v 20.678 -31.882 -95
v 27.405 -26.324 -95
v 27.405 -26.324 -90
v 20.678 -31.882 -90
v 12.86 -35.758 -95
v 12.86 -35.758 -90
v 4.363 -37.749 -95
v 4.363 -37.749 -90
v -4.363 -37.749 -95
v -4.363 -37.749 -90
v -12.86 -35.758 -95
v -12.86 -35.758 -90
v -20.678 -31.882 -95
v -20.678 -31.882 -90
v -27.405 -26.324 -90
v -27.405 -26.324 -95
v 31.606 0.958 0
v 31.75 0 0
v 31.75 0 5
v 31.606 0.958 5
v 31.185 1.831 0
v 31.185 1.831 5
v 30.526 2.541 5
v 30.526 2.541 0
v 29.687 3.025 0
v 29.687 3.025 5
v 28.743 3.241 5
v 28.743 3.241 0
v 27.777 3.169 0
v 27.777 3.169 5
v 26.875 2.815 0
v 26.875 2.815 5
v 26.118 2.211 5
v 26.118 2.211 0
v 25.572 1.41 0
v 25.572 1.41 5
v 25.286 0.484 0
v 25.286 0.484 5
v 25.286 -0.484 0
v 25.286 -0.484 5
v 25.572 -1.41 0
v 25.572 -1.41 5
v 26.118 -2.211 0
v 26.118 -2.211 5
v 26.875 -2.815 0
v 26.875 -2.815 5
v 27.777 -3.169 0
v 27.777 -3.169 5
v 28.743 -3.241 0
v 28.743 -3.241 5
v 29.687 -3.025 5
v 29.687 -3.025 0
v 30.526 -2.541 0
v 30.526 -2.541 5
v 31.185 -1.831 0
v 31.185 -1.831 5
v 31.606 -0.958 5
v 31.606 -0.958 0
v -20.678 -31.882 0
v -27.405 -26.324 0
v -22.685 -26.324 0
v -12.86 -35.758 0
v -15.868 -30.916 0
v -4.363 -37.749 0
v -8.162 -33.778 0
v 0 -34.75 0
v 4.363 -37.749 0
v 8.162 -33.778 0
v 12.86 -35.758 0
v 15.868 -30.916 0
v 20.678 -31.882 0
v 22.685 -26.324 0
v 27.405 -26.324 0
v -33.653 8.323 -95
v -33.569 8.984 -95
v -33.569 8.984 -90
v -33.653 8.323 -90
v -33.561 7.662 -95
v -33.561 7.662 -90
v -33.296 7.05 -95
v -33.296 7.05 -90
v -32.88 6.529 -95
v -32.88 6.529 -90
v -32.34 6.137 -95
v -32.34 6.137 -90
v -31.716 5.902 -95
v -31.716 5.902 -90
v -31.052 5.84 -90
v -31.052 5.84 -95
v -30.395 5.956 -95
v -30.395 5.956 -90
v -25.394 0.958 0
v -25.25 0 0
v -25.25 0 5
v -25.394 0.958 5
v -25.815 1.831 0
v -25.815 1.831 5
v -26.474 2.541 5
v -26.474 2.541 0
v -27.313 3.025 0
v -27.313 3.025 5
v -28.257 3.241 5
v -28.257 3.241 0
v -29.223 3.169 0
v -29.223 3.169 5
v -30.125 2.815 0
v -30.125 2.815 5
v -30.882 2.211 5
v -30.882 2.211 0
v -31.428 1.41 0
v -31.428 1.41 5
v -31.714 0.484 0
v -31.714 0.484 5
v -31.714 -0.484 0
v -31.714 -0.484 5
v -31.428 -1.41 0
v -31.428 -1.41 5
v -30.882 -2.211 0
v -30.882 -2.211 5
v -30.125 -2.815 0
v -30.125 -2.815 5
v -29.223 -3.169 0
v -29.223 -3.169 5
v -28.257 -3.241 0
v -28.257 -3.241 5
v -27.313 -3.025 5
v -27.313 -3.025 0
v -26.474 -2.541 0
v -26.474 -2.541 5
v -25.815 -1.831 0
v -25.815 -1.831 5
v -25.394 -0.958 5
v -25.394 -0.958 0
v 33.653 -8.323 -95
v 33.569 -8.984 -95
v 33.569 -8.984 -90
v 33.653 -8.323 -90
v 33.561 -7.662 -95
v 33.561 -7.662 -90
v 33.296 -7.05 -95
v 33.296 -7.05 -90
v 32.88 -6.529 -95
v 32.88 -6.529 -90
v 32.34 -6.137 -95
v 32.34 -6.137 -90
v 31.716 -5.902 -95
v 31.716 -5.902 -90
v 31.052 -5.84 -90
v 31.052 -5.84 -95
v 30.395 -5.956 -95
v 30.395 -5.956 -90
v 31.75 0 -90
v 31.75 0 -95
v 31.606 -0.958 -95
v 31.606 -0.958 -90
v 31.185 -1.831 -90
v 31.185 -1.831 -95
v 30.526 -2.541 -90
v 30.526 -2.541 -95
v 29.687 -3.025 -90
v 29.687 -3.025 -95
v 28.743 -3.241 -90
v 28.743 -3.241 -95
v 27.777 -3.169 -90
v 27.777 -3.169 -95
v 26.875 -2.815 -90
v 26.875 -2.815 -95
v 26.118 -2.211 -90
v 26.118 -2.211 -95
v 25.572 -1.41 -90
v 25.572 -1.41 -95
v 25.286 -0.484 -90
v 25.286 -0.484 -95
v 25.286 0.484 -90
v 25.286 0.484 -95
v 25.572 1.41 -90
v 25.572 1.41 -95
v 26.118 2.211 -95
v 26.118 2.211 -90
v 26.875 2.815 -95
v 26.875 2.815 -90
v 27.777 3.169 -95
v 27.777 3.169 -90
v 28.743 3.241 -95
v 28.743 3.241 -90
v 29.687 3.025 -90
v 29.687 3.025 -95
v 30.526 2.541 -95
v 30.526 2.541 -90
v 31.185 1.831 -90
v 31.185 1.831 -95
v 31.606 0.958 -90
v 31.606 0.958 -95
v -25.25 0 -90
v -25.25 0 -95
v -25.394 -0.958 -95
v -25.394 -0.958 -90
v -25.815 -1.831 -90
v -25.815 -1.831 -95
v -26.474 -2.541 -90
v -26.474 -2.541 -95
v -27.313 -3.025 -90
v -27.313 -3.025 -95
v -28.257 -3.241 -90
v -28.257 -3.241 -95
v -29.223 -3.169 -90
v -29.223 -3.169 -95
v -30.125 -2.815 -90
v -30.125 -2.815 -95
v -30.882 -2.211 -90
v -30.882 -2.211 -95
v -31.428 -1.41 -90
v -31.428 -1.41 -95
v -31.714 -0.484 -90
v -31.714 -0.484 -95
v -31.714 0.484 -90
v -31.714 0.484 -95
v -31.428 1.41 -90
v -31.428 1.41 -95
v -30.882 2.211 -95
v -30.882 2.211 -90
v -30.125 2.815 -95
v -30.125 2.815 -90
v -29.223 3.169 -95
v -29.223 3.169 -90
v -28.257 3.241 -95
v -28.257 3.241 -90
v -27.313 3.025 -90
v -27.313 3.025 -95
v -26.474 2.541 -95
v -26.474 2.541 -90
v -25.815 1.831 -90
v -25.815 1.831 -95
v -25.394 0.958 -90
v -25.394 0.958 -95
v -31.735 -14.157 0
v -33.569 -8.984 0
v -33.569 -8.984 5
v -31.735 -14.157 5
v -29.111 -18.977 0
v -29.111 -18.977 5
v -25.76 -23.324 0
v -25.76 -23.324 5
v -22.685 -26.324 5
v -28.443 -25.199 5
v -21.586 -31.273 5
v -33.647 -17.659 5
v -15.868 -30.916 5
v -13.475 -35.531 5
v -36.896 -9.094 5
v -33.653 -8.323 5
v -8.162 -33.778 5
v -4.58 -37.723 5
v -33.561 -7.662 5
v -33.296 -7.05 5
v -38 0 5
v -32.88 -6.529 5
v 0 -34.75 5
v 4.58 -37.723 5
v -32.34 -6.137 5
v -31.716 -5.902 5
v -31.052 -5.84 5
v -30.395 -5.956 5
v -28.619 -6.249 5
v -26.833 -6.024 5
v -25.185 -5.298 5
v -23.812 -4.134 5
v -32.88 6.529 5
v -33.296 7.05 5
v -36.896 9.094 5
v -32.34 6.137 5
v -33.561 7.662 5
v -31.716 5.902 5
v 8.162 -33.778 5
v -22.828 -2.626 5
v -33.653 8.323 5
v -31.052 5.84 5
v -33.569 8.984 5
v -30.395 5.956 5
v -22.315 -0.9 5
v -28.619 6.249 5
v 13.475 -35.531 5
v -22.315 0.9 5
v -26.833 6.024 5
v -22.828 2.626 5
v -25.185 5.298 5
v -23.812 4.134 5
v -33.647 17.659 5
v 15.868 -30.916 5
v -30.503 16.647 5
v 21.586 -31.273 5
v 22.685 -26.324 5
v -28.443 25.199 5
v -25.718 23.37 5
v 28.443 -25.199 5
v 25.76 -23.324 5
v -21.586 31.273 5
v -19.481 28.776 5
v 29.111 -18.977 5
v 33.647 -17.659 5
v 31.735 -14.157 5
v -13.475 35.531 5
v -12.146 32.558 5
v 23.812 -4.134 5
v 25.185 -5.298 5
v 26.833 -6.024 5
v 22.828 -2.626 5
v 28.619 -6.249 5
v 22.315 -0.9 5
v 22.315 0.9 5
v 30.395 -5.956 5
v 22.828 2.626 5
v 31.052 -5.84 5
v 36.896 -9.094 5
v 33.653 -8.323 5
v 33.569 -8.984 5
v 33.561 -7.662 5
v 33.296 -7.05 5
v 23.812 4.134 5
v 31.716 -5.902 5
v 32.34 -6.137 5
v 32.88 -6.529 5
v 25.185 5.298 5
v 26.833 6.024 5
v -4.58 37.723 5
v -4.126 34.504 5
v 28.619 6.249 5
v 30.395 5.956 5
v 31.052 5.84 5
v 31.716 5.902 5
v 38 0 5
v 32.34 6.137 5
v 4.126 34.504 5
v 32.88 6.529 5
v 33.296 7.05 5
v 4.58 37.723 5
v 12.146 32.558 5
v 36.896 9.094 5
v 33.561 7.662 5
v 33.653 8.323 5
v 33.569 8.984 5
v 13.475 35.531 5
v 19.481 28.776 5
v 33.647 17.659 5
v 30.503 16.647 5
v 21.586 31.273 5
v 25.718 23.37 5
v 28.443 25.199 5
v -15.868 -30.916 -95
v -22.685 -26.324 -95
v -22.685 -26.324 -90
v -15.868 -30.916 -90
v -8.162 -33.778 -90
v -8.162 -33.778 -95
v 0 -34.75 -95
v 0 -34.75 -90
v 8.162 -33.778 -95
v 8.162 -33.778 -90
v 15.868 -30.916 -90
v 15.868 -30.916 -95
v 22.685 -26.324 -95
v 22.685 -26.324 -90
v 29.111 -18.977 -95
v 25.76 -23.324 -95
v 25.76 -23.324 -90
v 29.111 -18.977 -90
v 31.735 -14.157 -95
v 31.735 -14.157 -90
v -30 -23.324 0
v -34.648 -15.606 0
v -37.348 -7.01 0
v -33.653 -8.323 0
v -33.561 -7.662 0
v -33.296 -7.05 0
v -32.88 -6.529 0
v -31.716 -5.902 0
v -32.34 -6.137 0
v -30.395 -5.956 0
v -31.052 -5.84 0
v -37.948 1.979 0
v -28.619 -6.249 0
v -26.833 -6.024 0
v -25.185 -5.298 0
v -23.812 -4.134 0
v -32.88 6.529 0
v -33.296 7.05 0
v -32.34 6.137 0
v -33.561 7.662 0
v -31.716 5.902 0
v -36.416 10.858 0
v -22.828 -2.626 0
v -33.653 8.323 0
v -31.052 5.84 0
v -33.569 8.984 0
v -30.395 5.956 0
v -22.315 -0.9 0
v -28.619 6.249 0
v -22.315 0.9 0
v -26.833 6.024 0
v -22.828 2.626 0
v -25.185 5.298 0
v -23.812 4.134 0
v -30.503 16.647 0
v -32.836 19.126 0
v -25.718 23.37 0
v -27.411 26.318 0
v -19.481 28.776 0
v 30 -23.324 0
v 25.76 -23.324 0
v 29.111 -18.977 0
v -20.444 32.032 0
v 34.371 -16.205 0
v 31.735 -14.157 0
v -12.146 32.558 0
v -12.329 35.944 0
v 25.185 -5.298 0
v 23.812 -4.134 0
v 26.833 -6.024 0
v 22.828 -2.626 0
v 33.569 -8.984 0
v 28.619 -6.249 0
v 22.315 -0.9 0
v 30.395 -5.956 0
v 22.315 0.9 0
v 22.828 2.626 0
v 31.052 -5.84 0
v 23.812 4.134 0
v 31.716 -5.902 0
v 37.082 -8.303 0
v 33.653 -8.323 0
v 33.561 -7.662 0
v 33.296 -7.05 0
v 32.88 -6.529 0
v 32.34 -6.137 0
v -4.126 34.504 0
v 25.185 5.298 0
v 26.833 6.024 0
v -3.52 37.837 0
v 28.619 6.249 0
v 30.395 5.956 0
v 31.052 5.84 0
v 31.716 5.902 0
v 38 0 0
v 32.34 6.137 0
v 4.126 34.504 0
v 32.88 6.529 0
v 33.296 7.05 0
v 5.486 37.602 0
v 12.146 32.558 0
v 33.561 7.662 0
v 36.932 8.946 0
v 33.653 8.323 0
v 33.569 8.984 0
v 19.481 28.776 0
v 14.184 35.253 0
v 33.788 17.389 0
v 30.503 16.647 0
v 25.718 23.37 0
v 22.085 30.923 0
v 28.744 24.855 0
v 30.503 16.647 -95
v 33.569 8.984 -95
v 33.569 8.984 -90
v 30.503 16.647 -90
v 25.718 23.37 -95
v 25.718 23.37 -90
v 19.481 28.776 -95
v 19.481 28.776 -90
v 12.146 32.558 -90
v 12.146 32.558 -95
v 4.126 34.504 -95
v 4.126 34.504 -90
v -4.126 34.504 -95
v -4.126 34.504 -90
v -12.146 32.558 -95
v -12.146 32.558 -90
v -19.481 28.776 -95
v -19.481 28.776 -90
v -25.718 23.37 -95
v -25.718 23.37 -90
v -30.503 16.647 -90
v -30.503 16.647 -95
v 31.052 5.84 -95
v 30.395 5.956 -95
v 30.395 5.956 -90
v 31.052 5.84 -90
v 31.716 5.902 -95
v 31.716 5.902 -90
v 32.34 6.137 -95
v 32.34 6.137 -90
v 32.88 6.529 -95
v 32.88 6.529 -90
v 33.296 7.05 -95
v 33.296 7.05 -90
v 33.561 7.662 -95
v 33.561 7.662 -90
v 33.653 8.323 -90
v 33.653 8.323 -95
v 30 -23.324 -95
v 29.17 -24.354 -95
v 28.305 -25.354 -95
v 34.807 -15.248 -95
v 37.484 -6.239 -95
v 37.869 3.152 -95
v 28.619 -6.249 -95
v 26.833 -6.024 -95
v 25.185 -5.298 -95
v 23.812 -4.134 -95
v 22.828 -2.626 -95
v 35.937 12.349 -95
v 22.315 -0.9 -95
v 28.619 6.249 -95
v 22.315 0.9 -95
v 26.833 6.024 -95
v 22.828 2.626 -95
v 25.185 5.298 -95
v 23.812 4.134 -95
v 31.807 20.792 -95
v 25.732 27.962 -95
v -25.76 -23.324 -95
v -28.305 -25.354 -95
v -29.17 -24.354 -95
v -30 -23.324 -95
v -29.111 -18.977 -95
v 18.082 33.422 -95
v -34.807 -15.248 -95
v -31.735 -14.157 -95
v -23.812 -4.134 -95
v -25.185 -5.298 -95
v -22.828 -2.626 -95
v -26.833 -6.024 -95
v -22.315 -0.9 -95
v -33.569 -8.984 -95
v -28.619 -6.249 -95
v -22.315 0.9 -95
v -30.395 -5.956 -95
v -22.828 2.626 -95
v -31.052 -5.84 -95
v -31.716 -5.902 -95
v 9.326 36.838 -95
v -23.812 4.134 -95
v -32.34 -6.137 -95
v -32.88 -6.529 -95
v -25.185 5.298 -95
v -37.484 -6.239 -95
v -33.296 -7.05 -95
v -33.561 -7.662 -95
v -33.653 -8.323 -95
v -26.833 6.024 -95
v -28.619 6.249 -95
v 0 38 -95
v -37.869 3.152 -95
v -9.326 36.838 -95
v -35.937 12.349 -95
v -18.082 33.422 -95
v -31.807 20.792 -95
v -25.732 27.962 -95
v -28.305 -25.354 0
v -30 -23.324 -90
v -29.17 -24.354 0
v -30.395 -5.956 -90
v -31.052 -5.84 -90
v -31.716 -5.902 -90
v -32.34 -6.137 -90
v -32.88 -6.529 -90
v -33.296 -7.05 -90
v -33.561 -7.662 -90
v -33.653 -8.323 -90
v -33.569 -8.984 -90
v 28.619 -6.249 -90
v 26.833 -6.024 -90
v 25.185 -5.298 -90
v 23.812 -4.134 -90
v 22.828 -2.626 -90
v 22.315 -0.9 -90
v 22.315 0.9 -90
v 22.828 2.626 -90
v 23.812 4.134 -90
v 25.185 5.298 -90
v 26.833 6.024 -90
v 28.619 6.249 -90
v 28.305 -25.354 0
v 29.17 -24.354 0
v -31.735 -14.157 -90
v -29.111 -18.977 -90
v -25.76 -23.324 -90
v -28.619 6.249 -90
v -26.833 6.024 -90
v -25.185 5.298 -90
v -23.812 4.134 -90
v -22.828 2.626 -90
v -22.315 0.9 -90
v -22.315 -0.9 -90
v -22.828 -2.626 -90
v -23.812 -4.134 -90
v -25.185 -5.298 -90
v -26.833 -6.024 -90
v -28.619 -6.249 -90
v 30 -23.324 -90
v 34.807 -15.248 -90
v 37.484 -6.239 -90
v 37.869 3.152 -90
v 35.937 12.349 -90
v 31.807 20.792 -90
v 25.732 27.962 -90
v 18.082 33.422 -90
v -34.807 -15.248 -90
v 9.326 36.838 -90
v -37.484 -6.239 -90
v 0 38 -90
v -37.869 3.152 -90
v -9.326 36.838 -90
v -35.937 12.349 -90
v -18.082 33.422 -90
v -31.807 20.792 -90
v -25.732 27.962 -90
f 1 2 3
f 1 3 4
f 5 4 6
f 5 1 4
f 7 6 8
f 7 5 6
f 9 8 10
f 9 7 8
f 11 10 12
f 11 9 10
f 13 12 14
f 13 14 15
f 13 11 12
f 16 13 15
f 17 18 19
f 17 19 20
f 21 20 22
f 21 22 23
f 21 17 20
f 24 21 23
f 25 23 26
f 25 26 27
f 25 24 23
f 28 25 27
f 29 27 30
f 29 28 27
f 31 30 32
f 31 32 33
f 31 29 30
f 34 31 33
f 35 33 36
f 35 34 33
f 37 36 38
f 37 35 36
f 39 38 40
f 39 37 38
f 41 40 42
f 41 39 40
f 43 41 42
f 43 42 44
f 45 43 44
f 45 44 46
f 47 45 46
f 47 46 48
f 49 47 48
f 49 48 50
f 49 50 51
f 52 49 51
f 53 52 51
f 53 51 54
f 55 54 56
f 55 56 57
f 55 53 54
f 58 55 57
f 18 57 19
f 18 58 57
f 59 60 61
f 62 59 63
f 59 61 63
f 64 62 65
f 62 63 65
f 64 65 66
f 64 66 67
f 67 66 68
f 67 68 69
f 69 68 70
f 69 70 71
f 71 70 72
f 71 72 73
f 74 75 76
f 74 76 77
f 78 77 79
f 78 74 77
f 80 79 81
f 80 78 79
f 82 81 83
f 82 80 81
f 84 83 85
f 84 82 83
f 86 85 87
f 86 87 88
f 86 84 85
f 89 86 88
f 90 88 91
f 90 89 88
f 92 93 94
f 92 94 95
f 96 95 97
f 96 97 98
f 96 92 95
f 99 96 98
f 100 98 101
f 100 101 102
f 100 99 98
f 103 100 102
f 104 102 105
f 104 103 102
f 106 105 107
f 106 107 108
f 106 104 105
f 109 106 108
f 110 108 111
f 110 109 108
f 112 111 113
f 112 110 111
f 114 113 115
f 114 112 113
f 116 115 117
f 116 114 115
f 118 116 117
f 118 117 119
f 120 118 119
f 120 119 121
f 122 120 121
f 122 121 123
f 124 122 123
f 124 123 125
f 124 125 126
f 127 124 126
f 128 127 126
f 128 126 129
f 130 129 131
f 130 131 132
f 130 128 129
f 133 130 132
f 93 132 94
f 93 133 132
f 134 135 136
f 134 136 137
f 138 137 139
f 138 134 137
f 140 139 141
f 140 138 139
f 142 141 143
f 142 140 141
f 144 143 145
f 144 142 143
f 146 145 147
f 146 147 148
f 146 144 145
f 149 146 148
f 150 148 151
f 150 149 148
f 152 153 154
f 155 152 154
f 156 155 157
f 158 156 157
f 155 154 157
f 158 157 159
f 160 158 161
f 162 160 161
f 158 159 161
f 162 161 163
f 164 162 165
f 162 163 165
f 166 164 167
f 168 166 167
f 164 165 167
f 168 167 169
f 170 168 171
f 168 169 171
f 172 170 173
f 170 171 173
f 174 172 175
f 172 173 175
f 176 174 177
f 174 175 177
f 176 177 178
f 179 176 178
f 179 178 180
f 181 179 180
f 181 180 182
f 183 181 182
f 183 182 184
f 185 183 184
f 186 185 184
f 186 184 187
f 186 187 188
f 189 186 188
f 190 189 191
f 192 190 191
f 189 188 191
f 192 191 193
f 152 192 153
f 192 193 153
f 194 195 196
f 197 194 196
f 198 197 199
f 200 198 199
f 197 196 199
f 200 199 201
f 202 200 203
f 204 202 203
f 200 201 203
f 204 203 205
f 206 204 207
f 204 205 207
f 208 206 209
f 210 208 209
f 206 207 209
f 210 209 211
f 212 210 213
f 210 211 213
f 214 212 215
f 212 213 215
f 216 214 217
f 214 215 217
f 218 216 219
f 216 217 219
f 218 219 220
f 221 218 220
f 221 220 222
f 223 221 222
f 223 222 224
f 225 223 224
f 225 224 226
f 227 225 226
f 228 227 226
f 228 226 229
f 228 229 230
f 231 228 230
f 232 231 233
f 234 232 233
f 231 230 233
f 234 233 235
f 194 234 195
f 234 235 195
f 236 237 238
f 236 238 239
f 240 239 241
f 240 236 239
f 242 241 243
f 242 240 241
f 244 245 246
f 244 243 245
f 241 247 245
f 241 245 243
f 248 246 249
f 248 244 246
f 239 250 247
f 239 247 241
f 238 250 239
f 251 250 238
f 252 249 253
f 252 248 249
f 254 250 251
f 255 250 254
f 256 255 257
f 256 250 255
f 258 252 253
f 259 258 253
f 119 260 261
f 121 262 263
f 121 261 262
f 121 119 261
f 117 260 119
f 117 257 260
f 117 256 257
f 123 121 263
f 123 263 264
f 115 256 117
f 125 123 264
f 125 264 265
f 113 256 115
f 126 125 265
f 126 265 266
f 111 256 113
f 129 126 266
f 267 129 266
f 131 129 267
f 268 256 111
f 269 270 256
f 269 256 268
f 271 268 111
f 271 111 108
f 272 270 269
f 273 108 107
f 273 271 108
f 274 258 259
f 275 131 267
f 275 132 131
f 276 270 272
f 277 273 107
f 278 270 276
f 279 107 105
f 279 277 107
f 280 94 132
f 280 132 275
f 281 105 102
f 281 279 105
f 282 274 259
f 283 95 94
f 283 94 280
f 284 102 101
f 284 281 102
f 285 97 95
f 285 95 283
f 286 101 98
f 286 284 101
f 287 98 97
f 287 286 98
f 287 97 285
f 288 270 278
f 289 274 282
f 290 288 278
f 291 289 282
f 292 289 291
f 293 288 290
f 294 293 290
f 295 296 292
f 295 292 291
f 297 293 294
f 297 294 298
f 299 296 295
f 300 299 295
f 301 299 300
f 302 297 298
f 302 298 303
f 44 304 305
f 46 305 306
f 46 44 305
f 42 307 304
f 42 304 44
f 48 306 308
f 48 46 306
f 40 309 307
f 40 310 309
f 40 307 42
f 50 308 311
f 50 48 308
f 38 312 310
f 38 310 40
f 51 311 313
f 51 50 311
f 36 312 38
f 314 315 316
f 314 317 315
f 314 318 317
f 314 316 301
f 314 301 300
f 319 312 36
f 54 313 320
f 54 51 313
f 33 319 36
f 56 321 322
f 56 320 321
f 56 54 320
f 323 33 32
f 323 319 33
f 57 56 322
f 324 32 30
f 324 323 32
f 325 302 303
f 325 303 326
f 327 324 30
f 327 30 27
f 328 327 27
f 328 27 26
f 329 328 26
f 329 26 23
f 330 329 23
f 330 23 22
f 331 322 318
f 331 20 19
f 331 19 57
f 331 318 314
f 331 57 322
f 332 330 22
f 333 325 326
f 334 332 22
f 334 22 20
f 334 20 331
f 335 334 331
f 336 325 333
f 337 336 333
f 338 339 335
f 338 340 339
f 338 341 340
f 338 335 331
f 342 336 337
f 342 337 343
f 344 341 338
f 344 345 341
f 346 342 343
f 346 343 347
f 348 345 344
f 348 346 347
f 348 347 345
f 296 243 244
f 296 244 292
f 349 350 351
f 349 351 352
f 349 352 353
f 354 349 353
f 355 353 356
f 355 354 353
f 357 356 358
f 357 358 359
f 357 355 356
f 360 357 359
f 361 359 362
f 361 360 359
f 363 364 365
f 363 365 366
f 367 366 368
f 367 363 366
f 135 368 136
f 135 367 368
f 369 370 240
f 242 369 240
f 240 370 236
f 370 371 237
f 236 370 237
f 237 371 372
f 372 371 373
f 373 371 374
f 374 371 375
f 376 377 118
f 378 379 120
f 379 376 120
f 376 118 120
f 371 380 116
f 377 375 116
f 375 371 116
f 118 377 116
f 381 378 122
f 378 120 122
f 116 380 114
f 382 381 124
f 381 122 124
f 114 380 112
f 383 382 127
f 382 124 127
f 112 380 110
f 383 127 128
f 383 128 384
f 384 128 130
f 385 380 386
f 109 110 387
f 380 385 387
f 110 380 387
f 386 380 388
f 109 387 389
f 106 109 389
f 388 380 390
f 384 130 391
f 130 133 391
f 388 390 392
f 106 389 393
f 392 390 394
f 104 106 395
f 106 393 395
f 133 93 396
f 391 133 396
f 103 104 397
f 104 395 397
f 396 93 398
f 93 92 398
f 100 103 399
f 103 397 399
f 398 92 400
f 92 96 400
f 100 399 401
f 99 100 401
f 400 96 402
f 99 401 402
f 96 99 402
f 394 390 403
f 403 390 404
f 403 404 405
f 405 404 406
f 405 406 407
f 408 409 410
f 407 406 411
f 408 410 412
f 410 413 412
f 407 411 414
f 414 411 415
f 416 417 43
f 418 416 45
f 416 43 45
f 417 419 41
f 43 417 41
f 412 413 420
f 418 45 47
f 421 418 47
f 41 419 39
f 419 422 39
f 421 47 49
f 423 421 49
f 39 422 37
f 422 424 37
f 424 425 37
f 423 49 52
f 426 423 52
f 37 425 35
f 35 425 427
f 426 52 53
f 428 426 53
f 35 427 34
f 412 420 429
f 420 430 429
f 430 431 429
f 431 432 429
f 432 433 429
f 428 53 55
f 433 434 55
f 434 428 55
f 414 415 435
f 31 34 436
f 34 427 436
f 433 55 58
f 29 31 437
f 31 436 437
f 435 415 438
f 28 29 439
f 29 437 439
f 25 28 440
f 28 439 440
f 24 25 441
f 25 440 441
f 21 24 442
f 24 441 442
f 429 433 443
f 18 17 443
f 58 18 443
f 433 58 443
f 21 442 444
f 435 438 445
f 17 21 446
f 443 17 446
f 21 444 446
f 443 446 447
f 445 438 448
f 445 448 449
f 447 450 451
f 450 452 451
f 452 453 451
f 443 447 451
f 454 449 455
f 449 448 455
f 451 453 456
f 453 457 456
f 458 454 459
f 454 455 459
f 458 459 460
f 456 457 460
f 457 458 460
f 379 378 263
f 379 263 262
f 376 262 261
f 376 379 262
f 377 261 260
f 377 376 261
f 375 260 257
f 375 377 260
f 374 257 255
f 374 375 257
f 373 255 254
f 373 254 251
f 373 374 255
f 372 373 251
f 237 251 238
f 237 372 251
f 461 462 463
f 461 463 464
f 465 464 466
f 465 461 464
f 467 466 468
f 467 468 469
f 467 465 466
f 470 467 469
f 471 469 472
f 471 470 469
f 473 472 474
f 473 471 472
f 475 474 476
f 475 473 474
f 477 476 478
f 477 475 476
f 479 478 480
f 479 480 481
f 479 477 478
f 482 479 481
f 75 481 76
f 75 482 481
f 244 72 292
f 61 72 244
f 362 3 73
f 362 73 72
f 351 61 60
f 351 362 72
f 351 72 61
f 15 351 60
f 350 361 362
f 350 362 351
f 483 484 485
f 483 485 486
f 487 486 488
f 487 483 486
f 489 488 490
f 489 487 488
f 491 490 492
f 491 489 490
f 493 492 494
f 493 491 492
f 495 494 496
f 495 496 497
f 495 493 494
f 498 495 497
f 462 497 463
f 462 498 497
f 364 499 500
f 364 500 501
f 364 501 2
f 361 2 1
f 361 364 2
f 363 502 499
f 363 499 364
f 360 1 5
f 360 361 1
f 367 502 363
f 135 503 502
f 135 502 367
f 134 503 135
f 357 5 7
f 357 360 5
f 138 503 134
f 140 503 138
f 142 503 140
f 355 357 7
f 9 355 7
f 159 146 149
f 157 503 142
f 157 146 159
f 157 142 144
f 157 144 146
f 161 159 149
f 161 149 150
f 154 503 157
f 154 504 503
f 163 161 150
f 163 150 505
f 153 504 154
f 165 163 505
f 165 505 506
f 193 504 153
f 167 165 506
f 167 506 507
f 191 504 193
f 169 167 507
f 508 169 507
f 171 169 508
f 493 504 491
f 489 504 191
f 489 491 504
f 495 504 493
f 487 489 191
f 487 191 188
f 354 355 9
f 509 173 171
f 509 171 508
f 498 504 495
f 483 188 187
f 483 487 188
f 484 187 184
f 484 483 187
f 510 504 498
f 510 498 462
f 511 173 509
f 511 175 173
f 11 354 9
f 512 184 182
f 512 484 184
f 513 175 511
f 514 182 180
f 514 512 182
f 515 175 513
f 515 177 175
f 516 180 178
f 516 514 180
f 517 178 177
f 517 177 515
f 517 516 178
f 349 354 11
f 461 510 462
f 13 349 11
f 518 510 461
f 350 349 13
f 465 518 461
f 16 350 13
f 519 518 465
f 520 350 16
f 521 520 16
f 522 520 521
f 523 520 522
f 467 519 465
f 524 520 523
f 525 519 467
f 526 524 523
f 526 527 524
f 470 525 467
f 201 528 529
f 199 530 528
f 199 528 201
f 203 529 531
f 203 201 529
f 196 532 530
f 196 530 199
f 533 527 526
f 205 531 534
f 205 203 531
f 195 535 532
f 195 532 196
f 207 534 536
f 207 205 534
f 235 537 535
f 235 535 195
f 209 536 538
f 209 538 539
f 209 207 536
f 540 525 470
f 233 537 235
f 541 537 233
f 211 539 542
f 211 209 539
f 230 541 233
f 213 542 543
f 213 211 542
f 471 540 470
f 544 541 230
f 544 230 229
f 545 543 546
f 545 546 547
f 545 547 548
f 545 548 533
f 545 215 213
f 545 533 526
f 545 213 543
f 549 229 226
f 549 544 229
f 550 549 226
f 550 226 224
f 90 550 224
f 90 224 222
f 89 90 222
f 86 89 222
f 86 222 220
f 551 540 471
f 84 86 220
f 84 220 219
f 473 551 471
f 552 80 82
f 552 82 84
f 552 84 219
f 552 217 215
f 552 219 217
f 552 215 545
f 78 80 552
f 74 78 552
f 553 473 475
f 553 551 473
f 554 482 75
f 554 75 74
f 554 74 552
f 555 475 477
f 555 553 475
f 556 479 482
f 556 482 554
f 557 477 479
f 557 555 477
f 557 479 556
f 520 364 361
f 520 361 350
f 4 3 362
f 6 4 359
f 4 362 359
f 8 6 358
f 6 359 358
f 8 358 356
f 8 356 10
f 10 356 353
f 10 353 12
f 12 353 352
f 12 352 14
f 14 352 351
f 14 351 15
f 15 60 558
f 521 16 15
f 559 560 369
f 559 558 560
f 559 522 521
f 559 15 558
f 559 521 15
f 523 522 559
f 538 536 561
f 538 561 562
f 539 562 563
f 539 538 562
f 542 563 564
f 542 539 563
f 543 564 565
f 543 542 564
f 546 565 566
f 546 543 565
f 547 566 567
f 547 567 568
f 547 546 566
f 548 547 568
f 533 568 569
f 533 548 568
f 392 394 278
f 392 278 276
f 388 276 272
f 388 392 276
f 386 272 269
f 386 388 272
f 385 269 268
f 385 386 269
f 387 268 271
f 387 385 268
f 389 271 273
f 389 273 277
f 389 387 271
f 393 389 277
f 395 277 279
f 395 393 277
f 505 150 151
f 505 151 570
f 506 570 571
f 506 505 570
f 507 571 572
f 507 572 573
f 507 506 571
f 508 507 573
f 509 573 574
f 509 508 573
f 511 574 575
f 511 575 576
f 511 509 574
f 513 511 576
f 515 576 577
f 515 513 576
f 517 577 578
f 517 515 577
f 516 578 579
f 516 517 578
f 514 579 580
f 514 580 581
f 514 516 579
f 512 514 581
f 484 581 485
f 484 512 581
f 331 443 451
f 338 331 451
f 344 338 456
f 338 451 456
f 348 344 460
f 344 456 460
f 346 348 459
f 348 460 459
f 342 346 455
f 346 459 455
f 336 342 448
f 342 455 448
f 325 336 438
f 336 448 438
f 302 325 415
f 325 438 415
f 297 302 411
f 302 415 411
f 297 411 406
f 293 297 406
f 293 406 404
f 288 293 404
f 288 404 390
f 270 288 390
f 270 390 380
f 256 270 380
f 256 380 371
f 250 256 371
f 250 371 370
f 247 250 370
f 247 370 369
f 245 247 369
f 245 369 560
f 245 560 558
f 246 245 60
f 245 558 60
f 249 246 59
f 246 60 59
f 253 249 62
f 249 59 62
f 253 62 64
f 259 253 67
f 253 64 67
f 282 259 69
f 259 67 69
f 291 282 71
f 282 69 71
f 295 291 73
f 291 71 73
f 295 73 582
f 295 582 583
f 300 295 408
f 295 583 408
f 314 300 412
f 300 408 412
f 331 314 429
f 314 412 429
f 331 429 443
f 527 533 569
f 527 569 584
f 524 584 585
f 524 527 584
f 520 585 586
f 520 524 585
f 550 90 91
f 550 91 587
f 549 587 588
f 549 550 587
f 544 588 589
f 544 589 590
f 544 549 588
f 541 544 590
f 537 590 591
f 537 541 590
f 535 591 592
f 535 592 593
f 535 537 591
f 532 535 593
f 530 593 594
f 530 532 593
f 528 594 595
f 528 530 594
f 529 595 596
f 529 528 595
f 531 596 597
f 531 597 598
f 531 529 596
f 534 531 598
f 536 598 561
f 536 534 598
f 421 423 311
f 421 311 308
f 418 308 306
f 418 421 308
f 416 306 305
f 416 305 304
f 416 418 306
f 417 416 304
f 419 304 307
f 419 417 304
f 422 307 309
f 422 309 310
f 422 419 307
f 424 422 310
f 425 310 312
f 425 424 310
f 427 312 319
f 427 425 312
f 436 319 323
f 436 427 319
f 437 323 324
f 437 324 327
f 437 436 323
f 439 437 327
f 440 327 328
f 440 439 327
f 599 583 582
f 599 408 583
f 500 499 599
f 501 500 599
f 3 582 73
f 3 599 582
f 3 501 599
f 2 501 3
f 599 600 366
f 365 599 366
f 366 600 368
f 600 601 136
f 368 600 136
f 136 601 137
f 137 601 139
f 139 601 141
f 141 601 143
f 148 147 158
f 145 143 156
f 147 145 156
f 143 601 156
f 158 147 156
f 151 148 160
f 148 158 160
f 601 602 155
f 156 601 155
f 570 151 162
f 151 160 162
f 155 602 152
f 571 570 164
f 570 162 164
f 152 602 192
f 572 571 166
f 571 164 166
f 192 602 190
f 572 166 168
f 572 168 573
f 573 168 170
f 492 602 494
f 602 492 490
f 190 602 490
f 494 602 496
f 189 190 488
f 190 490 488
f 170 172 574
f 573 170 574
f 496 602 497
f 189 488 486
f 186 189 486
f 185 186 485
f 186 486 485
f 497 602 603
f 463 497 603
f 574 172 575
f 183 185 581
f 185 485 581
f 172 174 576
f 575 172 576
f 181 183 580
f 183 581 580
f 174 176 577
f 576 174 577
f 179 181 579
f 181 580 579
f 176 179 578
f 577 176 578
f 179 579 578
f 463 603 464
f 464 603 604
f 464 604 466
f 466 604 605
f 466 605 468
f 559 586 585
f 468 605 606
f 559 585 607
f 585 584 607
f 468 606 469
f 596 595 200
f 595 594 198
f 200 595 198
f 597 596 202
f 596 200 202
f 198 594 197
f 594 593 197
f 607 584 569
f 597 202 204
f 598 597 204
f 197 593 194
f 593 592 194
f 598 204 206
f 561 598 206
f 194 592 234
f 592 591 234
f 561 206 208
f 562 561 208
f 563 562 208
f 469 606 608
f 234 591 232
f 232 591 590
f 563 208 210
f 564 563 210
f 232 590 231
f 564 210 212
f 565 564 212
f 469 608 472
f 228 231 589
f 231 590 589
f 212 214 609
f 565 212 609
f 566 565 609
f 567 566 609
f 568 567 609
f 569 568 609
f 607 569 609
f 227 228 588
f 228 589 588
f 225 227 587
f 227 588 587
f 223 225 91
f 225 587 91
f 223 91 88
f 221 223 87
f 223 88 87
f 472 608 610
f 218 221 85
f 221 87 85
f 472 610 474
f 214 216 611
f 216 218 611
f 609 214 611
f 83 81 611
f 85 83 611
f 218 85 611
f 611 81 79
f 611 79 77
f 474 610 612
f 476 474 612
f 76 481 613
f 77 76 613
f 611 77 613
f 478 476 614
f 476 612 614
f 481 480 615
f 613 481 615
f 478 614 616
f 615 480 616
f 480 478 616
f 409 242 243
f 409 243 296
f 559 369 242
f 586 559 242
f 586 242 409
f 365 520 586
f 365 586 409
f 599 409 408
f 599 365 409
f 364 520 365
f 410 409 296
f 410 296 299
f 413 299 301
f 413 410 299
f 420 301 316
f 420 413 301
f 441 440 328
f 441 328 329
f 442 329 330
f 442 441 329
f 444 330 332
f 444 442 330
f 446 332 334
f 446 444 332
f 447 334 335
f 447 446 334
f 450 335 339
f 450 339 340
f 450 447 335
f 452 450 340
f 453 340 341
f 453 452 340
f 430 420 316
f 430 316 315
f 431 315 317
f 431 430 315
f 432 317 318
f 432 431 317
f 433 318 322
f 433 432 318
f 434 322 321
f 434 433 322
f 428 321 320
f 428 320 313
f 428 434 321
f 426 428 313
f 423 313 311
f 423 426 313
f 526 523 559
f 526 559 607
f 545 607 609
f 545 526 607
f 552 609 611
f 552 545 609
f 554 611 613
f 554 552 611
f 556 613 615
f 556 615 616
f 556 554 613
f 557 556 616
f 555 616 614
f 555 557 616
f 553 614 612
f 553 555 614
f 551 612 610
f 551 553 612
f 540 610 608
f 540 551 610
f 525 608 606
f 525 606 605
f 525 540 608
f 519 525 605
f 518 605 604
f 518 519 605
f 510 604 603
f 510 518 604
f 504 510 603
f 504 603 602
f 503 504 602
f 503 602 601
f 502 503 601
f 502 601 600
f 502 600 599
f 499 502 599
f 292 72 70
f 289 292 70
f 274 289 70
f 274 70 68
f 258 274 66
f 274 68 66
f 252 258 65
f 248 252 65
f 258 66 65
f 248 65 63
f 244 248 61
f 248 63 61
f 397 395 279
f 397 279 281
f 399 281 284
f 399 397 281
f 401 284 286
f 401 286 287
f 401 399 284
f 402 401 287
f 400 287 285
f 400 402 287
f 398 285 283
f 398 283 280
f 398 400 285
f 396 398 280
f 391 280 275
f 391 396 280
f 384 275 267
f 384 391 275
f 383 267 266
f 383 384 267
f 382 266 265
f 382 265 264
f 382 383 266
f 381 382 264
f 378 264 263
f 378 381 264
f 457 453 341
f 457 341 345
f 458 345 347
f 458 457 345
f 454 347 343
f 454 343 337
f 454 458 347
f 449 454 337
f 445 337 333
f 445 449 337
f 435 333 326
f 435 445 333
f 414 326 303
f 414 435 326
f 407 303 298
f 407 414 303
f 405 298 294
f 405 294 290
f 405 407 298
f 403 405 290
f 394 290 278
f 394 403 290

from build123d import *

# Parameters (mm, degrees)
SKETCH1_R           = 38
SKETCH1_R_2         = 3.25
BOSS_EXTRUDE1_DEPTH = 5
BOSS_EXTRUDE2_START = 90
BOSS_EXTRUDE2_DEPTH = 90
BOSS_EXTRUDE3_START = 5
SKETCH3_R           = 3.25
BOSS_EXTRUDE3_DEPTH = 5


with BuildPart() as part:
    # Sketch1 → Boss-Extrude1 (new body)
    with BuildSketch(Plane.XY):
        Circle(SKETCH1_R)
        with Locations((-28.5, 0)):
            Circle(SKETCH1_R_2, mode=Mode.SUBTRACT)
        with Locations((28.5, 0)):
            Circle(SKETCH1_R_2, mode=Mode.SUBTRACT)
        with BuildLine():
            Line((-25.759706908, -23.323807579), (25.759706908, -23.323807579))
            ThreePointArc((25.759706908, -23.323807579), (30.518267855, -16.619200556), (33.568509452, -8.984301485))
            ThreePointArc((33.568509452, -8.984301485), (32.879612131, -6.529477906), (30.395363409, -5.955677757))
            ThreePointArc((30.395363409, -5.955677757), (22.25, 0), (30.395363409, 5.955677757))
            ThreePointArc((30.395363409, 5.955677757), (32.879612131, 6.529477906), (33.568509452, 8.984301485))
            ThreePointArc((33.568509452, 8.984301485), (0, 34.75), (-33.568509452, 8.984301485))
            ThreePointArc((-33.568509452, 8.984301485), (-32.879612131, 6.529477906), (-30.395363409, 5.955677757))
            ThreePointArc((-30.395363409, 5.955677757), (-22.25, 0), (-30.395363409, -5.955677757))
            ThreePointArc((-30.395363409, -5.955677757), (-32.879612131, -6.529477906), (-33.568509452, -8.984301485))
            ThreePointArc((-33.568509452, -8.984301485), (-30.518267855, -16.619200556), (-25.759706908, -23.323807579))
        make_face(mode=Mode.SUBTRACT)
        with BuildLine():
            Line((-22.685229876, -26.323807579), (22.685229876, -26.323807579))
            ThreePointArc((22.685229876, -26.323807579), (0, -34.75), (-22.685229876, -26.323807579))
        make_face(mode=Mode.SUBTRACT)
    extrude(amount=BOSS_EXTRUDE1_DEPTH)

    # Sketch2 → Boss-Extrude2 (add)
    with BuildSketch(Plane(origin=(0, 0, 0), x_dir=(-1, 0, 0), z_dir=(0, 0, -1)).offset(BOSS_EXTRUDE2_START)):
        with BuildLine():
            Line((-30, -23.323807579), (30, -23.323807579))
            ThreePointArc((30, -23.323807579), (28.741879175, -24.857682545), (27.405421991, -26.323807579))
            Line((27.405421991, -26.323807579), (-27.405421991, -26.323807579))
            ThreePointArc((-27.405421991, -26.323807579), (-28.741879175, -24.857682545), (-30, -23.323807579))
        make_face()
    extrude(amount=-BOSS_EXTRUDE2_DEPTH)

    # Sketch3 → Boss-Extrude3 (add)
    with BuildSketch(Plane(origin=(0, 0, -90), x_dir=(-1, 0, 0), z_dir=(0, 0, -1)).offset(BOSS_EXTRUDE3_START)):
        with BuildLine():
            ThreePointArc((-30, -23.323807579), (-28.741879175, -24.857682545), (-27.405421991, -26.323807579))
            ThreePointArc((-27.405421991, -26.323807579), (0, -38), (27.405421991, -26.323807579))
            ThreePointArc((27.405421991, -26.323807579), (28.741879175, -24.857682545), (30, -23.323807579))
            ThreePointArc((30, -23.323807579), (0, 38), (-30, -23.323807579))
        make_face()
        with Locations(Location((28.5, 0, 0), (0, 0, 180))):
            Circle(SKETCH3_R, mode=Mode.SUBTRACT)
        with Locations(Location((-28.5, 0, 0), (0, 0, 180))):
            Circle(SKETCH3_R, mode=Mode.SUBTRACT)
        with BuildLine():
            Line((-22.685229876, -26.323807579), (22.685229876, -26.323807579))
            ThreePointArc((22.685229876, -26.323807579), (0, -34.75), (-22.685229876, -26.323807579))
        make_face(mode=Mode.SUBTRACT)
        with BuildLine():
            Line((25.759706908, -23.323807579), (-25.759706908, -23.323807579))
            ThreePointArc((-25.759706908, -23.323807579), (-30.518267855, -16.619200556), (-33.568509452, -8.984301485))
            ThreePointArc((-33.568509452, -8.984301485), (-32.879612131, -6.529477906), (-30.395363409, -5.955677757))
            ThreePointArc((-30.395363409, -5.955677757), (-22.25, 0), (-30.395363409, 5.955677757))
            ThreePointArc((-30.395363409, 5.955677757), (-32.879612131, 6.529477906), (-33.568509452, 8.984301485))
            ThreePointArc((-33.568509452, 8.984301485), (0, 34.75), (33.568509452, 8.984301485))
            ThreePointArc((33.568509452, 8.984301485), (32.879612131, 6.529477906), (30.395363409, 5.955677757))
            ThreePointArc((30.395363409, 5.955677757), (22.25, 0), (30.395363409, -5.955677757))
            ThreePointArc((30.395363409, -5.955677757), (32.879612131, -6.529477906), (33.568509452, -8.984301485))
            ThreePointArc((33.568509452, -8.984301485), (30.518267855, -16.619200556), (25.759706908, -23.323807579))
        make_face(mode=Mode.SUBTRACT)
    extrude(amount=-BOSS_EXTRUDE3_DEPTH)


solid = part.part
